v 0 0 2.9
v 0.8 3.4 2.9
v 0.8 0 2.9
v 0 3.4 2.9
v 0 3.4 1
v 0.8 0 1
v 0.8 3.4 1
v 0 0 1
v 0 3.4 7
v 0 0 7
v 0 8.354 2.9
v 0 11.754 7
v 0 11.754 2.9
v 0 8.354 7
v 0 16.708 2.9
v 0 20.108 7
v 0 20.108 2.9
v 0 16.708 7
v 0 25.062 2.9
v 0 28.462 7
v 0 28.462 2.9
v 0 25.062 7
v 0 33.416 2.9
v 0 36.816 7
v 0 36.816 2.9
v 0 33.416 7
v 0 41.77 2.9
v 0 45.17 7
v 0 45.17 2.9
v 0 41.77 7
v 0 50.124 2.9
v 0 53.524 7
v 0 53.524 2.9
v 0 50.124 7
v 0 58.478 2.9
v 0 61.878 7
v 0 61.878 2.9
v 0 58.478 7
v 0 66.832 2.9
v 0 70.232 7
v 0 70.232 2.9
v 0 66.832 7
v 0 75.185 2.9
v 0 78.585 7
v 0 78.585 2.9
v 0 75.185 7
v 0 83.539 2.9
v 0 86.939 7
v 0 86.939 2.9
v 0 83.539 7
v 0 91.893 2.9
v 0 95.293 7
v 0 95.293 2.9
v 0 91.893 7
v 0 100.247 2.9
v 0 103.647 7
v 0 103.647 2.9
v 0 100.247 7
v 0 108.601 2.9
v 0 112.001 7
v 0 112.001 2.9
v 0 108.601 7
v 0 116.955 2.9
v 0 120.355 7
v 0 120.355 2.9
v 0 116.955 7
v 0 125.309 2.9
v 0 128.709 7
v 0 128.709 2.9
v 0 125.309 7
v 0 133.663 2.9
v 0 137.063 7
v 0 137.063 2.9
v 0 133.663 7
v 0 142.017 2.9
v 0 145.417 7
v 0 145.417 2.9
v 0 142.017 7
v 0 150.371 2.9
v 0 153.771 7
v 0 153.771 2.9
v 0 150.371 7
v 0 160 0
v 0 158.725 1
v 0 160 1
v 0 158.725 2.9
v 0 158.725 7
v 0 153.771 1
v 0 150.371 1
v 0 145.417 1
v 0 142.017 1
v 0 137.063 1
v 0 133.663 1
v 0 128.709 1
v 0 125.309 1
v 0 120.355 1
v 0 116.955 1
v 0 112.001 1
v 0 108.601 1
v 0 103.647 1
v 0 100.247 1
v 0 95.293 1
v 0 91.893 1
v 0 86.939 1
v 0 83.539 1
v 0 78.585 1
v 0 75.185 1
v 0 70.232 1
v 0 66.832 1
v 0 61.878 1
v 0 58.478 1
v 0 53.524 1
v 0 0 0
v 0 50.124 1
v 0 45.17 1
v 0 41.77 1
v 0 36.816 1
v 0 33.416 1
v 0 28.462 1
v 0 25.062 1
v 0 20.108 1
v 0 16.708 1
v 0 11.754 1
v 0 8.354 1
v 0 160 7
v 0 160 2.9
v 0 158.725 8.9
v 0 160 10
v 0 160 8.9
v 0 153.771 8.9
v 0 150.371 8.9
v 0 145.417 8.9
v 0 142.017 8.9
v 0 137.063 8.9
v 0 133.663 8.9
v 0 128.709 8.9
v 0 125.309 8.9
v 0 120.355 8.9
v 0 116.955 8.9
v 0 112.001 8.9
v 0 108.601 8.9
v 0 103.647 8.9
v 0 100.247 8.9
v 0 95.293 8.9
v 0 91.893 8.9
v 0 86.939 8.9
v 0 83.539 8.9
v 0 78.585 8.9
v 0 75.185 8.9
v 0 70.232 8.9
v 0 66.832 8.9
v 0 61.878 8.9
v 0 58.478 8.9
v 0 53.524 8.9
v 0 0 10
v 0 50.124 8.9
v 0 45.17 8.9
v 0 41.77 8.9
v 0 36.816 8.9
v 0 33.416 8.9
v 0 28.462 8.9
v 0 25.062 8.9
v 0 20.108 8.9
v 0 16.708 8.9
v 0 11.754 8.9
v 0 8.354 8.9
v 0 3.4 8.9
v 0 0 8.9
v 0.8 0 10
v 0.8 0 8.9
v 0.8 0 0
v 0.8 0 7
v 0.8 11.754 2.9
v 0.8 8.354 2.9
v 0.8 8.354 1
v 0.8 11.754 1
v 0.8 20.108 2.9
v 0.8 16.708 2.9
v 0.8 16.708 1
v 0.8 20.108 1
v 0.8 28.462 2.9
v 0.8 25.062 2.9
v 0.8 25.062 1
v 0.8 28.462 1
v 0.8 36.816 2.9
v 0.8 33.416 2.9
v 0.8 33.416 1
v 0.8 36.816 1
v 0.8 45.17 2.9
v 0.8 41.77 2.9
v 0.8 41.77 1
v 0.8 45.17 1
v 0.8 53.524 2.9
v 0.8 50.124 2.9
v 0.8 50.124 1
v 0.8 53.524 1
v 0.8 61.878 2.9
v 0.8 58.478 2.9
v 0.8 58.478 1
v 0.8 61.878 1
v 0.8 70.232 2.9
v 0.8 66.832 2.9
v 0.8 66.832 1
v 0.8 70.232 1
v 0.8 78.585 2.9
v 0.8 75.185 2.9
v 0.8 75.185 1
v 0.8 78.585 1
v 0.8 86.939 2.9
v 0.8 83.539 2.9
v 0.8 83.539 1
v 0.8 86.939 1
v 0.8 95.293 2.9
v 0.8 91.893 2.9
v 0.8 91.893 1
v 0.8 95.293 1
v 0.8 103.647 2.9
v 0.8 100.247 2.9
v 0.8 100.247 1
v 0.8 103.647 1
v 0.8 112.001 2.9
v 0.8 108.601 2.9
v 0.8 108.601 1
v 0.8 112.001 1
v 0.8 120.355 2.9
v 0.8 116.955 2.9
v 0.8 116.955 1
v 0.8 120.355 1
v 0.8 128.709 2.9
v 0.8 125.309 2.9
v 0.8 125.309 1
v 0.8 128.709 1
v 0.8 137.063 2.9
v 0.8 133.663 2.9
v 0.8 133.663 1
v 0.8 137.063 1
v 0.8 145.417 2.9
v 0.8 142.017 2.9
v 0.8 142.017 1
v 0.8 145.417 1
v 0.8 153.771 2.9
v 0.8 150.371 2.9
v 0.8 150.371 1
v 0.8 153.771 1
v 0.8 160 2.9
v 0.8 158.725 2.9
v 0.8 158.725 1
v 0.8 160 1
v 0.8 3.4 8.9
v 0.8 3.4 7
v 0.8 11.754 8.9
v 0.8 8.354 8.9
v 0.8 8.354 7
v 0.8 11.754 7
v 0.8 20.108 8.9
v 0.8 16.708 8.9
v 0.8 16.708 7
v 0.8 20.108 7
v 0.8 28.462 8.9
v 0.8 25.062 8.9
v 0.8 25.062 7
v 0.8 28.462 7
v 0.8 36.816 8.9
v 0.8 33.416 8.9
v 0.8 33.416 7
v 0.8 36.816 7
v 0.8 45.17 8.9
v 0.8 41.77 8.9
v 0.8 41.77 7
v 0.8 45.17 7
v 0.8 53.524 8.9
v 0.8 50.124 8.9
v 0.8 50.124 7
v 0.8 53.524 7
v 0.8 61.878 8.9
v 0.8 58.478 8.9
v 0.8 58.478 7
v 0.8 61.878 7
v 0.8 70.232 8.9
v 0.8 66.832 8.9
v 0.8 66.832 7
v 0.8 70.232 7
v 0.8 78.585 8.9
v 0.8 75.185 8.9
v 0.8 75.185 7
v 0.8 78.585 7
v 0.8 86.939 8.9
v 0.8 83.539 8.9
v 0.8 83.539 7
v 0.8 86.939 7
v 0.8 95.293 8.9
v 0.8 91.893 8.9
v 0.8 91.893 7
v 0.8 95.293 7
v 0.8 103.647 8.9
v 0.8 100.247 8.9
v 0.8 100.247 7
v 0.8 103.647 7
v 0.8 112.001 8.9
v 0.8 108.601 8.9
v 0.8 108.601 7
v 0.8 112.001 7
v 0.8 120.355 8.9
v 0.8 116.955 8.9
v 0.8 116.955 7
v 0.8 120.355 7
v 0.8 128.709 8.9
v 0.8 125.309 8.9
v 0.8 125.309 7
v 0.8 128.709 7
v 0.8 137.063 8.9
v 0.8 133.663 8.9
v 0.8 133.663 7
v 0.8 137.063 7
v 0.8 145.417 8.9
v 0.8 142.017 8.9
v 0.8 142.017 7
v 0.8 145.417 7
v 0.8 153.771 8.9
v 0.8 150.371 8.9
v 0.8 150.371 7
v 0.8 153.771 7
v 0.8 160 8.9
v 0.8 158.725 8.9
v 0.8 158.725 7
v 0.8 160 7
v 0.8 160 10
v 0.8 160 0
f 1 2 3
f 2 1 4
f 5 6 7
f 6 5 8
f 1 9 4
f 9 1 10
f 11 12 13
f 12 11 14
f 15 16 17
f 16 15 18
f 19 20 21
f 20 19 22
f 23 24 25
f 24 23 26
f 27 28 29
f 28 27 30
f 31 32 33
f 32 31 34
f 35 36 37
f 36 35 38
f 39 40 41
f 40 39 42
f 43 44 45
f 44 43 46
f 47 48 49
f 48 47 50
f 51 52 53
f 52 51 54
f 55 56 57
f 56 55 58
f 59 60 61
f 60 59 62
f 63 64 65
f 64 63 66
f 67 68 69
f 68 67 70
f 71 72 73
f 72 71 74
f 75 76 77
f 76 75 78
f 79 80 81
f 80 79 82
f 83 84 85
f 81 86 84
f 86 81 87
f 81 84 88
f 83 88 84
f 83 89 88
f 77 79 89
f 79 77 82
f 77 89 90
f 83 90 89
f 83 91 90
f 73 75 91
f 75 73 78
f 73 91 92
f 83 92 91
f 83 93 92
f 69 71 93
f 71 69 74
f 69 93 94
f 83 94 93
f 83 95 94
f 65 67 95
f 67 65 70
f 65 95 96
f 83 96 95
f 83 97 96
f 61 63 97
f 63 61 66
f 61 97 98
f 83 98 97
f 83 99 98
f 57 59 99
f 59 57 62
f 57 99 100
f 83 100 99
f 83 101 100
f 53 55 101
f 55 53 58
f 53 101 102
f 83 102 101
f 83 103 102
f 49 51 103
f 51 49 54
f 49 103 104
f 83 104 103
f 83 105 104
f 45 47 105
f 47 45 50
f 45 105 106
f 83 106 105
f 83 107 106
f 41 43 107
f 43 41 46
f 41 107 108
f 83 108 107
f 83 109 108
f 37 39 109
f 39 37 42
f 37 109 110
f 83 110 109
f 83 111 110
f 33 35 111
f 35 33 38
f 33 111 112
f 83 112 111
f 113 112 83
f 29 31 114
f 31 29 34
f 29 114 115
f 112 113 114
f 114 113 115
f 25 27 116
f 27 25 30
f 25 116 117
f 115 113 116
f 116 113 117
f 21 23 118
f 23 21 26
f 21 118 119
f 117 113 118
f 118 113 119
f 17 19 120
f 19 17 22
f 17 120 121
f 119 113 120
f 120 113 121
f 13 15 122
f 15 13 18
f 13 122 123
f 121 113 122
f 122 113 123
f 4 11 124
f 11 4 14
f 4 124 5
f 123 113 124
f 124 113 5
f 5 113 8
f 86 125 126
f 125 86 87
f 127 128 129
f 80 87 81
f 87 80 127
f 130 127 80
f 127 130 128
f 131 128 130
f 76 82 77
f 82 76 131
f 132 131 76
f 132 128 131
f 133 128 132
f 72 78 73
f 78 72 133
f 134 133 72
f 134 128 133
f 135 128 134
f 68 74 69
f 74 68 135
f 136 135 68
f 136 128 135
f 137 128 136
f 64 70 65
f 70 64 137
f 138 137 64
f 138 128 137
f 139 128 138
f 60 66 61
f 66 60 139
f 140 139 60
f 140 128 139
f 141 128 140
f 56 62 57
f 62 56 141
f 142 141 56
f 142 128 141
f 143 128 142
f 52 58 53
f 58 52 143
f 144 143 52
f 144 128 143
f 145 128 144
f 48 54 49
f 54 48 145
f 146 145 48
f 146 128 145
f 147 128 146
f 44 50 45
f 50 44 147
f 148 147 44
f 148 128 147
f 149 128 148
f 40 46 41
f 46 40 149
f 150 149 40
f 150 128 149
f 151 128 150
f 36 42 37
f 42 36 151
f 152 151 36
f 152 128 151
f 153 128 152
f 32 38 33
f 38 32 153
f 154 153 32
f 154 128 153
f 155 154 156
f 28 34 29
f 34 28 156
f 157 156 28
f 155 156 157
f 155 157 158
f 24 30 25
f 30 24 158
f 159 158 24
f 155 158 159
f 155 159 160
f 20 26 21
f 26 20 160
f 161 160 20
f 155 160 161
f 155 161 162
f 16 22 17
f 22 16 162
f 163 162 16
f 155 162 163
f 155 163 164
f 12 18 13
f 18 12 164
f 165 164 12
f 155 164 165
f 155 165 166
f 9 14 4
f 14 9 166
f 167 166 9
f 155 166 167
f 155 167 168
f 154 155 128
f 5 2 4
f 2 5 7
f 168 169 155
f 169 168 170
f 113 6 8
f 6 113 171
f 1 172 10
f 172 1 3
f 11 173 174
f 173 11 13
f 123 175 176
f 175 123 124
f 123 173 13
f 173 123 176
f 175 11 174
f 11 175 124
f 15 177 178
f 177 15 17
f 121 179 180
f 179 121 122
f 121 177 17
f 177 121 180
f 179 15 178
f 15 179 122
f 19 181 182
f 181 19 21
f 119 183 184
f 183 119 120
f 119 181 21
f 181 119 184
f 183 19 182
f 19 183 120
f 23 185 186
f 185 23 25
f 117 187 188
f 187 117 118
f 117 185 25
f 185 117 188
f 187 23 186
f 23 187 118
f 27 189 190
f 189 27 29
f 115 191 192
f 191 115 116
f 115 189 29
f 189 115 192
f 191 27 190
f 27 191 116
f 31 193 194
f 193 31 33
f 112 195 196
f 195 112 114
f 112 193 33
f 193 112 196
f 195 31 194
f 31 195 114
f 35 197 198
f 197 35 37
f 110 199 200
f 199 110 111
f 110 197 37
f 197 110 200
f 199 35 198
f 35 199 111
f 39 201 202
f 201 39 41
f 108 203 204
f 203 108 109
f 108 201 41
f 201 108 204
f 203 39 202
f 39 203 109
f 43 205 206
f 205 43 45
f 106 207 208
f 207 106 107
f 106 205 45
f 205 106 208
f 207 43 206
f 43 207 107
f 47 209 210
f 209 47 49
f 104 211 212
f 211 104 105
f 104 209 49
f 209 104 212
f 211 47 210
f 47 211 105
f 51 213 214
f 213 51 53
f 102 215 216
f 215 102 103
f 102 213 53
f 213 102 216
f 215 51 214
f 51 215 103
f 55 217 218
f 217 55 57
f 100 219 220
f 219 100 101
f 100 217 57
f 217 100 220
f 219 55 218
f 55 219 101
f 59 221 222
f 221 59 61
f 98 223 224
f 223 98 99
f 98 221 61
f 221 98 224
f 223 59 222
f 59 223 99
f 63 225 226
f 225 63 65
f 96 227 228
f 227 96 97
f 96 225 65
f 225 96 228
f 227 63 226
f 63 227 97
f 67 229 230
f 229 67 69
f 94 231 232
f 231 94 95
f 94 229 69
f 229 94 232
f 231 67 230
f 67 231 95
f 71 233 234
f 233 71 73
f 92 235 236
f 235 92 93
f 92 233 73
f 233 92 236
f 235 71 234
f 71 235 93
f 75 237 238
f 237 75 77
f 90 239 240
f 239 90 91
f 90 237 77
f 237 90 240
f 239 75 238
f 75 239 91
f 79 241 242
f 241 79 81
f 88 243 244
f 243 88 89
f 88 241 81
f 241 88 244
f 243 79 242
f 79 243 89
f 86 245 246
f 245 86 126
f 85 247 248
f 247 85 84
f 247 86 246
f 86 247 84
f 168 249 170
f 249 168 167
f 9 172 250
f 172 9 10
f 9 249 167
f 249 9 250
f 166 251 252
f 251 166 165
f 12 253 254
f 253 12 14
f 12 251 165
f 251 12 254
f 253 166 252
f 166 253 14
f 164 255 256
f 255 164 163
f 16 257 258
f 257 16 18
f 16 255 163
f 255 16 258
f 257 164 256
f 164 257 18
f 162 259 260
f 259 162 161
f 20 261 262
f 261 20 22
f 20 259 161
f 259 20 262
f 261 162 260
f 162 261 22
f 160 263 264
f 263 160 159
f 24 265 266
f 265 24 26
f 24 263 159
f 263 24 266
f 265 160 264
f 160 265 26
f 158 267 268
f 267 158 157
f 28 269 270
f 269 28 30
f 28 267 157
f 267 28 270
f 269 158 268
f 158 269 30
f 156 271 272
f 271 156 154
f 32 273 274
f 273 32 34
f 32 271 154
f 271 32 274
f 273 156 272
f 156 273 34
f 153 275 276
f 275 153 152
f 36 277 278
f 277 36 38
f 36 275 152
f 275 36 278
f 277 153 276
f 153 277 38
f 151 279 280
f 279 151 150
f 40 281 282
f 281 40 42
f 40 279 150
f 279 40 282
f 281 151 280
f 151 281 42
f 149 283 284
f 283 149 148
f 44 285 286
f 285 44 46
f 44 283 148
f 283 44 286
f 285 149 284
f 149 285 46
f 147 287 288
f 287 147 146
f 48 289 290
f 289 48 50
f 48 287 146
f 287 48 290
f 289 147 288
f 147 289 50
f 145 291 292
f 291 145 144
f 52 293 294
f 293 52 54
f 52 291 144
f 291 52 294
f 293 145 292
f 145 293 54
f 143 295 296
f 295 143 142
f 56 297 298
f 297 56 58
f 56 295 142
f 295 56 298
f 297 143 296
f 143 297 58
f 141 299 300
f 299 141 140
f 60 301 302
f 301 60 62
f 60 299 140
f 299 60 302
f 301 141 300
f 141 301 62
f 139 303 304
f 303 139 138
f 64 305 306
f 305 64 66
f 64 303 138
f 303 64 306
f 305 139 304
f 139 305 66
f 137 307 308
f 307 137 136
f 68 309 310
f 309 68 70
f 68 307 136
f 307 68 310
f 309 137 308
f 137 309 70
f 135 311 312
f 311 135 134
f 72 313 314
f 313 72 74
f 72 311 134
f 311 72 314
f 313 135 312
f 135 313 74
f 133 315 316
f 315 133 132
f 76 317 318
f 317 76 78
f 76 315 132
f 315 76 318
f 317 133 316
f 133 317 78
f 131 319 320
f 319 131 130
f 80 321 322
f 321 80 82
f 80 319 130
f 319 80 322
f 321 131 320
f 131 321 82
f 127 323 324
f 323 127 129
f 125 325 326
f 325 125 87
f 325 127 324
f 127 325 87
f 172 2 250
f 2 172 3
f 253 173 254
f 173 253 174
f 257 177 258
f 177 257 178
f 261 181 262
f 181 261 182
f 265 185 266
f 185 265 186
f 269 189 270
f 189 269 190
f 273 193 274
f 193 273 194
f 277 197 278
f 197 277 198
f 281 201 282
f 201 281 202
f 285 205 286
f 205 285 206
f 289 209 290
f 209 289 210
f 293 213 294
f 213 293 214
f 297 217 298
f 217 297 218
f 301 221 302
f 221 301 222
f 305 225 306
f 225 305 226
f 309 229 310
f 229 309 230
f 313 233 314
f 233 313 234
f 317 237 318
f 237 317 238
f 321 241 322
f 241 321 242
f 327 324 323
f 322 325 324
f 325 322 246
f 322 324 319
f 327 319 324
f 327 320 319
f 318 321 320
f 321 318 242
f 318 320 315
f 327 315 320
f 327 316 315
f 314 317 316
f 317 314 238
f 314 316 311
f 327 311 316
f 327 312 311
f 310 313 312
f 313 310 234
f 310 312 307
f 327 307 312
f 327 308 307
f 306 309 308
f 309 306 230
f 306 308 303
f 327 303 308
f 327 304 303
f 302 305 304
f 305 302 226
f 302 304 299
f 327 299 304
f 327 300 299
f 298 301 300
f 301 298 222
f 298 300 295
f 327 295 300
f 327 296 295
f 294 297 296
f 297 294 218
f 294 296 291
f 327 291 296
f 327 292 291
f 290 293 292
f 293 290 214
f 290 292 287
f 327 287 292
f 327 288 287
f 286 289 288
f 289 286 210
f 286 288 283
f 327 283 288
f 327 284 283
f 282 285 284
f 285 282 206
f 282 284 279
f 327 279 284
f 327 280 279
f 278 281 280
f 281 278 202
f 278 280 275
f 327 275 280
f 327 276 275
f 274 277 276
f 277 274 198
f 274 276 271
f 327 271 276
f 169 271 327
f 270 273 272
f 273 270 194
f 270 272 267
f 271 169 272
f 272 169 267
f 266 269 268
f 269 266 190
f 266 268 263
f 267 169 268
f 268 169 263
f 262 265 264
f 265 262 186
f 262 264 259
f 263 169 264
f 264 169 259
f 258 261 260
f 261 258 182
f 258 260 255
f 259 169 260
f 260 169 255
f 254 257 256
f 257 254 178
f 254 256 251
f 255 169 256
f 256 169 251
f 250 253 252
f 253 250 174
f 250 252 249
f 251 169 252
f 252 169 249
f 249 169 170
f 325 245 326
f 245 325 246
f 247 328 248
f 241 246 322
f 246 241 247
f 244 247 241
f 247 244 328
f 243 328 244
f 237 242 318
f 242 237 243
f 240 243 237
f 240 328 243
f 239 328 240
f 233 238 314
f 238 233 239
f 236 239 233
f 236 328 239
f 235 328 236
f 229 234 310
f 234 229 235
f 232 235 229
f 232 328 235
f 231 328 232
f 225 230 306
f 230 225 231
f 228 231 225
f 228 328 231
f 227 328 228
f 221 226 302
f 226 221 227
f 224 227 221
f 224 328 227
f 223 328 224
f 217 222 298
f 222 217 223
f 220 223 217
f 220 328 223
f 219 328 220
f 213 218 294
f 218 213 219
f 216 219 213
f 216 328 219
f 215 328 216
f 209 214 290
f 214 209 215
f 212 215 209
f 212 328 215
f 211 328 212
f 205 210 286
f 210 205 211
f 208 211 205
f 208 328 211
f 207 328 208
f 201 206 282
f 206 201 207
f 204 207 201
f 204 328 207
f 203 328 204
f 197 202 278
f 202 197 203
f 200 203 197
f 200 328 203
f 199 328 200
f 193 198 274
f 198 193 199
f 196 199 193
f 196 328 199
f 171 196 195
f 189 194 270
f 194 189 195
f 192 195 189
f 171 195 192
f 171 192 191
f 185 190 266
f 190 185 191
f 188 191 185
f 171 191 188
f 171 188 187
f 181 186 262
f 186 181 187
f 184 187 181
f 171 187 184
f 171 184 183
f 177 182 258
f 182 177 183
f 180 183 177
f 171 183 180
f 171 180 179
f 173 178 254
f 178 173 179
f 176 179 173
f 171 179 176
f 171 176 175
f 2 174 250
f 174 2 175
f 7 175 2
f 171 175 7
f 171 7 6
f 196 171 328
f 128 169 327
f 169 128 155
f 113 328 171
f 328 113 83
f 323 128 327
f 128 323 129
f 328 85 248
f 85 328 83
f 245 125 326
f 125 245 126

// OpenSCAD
dot_dist = 8.35394;
length = 160;

difference() {
    cube([0.8, length, 10]);
    for(i = [0:length/dot_dist]) translate([0, i*dot_dist, 1]) cube([1.5, 3.4, 1.9]);
    for(i = [0:length/dot_dist]) translate([0, i*dot_dist, 7]) cube([1.5, 3.4, 1.9]);
}
